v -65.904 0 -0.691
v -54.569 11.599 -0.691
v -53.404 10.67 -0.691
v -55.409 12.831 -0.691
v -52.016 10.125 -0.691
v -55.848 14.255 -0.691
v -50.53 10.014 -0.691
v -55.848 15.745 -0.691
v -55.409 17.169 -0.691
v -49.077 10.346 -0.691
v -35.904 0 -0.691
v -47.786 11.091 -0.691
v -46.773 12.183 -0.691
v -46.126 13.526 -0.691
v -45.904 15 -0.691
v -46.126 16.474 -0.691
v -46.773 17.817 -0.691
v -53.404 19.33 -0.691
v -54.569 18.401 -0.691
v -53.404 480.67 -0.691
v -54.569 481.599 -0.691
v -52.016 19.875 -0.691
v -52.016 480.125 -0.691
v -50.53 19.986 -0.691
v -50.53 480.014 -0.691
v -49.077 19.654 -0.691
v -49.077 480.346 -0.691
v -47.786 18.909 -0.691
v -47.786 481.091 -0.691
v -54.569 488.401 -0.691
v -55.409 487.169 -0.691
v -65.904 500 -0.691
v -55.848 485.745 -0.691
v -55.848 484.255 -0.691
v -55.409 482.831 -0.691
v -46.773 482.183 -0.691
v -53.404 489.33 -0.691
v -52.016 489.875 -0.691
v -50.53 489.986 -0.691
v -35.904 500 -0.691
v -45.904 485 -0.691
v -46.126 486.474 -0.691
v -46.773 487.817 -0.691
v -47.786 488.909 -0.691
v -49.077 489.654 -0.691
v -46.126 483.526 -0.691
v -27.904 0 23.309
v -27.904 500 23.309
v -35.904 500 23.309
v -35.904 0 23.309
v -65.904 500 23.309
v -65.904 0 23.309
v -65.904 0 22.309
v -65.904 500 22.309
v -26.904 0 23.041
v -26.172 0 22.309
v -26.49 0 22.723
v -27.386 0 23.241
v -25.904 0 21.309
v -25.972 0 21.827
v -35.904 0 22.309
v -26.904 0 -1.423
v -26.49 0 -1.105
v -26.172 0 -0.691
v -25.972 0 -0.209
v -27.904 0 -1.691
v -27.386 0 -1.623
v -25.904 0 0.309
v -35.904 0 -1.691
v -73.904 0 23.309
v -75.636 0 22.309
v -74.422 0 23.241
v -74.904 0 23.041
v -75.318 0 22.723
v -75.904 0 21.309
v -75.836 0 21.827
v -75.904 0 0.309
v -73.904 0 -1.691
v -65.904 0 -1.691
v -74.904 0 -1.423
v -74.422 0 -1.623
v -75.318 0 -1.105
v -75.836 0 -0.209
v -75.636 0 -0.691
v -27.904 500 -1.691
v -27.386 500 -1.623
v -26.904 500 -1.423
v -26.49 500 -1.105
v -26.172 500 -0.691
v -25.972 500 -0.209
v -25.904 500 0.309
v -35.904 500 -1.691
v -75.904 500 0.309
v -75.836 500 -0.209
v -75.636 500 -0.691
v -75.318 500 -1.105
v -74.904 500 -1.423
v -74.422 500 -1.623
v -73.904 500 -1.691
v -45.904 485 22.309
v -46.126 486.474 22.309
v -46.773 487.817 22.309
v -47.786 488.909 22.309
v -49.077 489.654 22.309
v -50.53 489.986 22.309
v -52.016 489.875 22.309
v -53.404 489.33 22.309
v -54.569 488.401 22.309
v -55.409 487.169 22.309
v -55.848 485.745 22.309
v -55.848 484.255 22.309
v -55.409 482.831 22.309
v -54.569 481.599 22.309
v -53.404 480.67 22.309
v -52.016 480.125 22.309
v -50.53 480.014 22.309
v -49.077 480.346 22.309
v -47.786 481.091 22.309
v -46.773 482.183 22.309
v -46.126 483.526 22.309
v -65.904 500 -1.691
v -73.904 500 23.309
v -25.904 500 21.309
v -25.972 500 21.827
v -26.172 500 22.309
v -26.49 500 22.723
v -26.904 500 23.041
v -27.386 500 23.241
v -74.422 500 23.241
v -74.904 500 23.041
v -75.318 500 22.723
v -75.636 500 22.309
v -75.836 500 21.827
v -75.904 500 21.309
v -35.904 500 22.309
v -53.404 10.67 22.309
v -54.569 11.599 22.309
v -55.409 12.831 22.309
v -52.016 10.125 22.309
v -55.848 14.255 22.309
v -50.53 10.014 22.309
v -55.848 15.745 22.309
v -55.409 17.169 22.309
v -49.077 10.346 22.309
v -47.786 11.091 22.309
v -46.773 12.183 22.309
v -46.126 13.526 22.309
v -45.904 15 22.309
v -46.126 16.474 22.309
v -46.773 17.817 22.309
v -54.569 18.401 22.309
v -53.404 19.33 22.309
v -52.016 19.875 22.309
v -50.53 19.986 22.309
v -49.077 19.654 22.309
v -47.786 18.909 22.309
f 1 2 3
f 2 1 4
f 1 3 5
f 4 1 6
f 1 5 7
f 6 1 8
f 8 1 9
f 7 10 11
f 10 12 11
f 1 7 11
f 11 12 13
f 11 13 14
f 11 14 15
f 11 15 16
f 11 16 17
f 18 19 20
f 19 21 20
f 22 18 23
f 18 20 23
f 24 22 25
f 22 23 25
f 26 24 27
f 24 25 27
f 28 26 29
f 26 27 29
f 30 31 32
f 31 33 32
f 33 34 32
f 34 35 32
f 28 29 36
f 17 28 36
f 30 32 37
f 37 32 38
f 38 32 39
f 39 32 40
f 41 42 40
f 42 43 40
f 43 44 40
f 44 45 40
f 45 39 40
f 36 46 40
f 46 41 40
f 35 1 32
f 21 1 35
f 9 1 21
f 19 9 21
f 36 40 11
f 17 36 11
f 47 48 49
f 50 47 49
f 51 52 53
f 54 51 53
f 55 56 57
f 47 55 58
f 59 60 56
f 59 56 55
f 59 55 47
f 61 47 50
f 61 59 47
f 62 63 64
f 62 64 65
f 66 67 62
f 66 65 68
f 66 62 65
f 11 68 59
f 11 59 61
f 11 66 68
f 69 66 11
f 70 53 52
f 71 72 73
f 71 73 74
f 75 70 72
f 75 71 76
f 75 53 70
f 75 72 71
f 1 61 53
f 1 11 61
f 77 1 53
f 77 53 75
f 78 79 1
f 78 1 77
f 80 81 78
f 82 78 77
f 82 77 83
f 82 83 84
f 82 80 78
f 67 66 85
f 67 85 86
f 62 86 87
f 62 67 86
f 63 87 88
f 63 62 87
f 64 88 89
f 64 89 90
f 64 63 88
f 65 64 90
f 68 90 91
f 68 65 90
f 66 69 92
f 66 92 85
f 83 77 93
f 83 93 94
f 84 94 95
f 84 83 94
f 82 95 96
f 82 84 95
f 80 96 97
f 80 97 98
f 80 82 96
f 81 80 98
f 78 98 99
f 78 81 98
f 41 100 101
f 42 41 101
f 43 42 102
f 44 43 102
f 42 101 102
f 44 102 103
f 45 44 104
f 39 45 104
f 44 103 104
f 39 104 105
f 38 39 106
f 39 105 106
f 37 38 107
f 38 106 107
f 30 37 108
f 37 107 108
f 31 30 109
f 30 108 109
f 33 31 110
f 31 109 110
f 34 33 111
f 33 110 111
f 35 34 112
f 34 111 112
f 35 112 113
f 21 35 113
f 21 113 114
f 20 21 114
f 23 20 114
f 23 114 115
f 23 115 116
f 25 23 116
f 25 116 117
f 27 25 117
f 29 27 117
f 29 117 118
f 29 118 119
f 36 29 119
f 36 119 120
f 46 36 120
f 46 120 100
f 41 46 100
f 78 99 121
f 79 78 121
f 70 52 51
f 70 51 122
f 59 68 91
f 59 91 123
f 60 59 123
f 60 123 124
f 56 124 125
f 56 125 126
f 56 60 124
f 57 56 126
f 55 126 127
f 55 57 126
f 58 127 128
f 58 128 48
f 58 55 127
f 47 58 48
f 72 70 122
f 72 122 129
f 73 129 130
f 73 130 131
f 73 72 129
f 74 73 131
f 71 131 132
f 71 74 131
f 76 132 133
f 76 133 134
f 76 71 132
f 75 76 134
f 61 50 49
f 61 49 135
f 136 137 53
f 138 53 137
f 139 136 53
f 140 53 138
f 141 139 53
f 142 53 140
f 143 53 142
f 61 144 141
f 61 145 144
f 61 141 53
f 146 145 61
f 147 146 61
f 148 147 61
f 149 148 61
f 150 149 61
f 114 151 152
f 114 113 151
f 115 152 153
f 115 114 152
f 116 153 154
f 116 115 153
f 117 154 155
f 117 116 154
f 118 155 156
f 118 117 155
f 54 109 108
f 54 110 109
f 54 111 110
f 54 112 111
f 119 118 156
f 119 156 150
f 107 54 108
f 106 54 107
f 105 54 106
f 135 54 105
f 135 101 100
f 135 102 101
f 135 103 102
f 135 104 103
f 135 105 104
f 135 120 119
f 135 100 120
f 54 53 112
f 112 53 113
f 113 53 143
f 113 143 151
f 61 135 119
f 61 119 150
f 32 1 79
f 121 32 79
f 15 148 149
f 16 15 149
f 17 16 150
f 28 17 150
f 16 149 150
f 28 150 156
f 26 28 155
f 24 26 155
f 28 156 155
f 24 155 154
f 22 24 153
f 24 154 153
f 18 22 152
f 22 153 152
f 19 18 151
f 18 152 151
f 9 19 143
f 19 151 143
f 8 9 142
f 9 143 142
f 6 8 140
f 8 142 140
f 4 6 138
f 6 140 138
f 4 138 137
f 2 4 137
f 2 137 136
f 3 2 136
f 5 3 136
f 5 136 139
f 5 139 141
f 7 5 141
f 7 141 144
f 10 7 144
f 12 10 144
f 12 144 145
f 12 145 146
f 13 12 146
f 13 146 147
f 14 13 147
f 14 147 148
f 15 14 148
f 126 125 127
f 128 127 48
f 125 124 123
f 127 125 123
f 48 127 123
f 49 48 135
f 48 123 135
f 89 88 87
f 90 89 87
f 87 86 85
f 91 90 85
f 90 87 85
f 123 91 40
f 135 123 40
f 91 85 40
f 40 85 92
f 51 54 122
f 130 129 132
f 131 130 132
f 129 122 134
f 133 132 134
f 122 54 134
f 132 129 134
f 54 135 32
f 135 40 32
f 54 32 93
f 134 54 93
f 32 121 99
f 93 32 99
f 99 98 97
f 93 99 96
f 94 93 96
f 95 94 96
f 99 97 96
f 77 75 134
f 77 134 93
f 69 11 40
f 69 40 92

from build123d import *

# Parameters (mm, degrees)
BOSS_EXTRUDE1_DEPTH              = 500
SKETCH3_W                        = 30
SKETCH3_H                        = 1
CUT_EXTRUDE1_DEPTH               = 500
M10X1_0_TAPPED_HOLE1_D           = 9
M10X1_0_TAPPED_HOLE1_DEPTH       = 51.26
M10X1_0_TAPPED_HOLE1_CBORE_D     = 10
M10X1_0_TAPPED_HOLE1_CBORE_DEPTH = 45.4
M10X1_0_TAPPED_HOLE1_TIP         = 2.703872786


with BuildPart() as part:
    # Sketch1 → Boss-Extrude1 (new body)
    with BuildSketch(Plane(origin=(0, 0, 0), x_dir=(1, 0, 0), z_dir=(0, 1, 0))):
        with BuildLine():
            Line((-73.903884132, 1.690933219), (-27.903884132, 1.690933219))
            ThreePointArc((-27.903884132, 1.690933219), (-26.48967057, 1.105146782), (-25.903884132, -0.309066781))
            Line((-25.903884132, -0.309066781), (-25.903884132, -21.309066781))
            ThreePointArc((-25.903884132, -21.309066781), (-26.48967057, -22.723280343), (-27.903884132, -23.309066781))
            Line((-27.903884132, -23.309066781), (-73.903884132, -23.309066781))
            ThreePointArc((-73.903884132, -23.309066781), (-75.318097695, -22.723280343), (-75.903884132, -21.309066781))
            Line((-75.903884132, -21.309066781), (-75.903884132, -0.309066781))
            ThreePointArc((-75.903884132, -0.309066781), (-75.318097695, 1.105146782), (-73.903884132, 1.690933219))
        make_face()
    extrude(amount=BOSS_EXTRUDE1_DEPTH)

    # Sketch3 → Cut-Extrude1 (cut)
    with BuildSketch(Plane(origin=(0, 500, 0), x_dir=(1, 0, 0), z_dir=(0, 1, 0))):
        with Locations((-50.903884132, 1.190933219)):
            Rectangle(SKETCH3_W, SKETCH3_H)
        with Locations((-50.903884132, -22.809066781)):
            Rectangle(SKETCH3_W, SKETCH3_H)
    extrude(amount=-CUT_EXTRUDE1_DEPTH, mode=Mode.SUBTRACT)

    # M10x1.0 Tapped Hole1
    with Locations(Plane(origin=(-50.903884132, 485, 22.309066781), x_dir=(1, 0, 0), z_dir=(0, 0, 1))):
        with Locations((0, 0), (0, -470)):
            CounterBoreHole(M10X1_0_TAPPED_HOLE1_D / 2, M10X1_0_TAPPED_HOLE1_CBORE_D / 2, M10X1_0_TAPPED_HOLE1_CBORE_DEPTH, depth=M10X1_0_TAPPED_HOLE1_DEPTH)
            with Locations((0, 0, -(M10X1_0_TAPPED_HOLE1_DEPTH + M10X1_0_TAPPED_HOLE1_TIP / 2))):  # 118° drill point
                Cone(0, M10X1_0_TAPPED_HOLE1_D / 2, M10X1_0_TAPPED_HOLE1_TIP, mode=Mode.SUBTRACT)


solid = part.part
